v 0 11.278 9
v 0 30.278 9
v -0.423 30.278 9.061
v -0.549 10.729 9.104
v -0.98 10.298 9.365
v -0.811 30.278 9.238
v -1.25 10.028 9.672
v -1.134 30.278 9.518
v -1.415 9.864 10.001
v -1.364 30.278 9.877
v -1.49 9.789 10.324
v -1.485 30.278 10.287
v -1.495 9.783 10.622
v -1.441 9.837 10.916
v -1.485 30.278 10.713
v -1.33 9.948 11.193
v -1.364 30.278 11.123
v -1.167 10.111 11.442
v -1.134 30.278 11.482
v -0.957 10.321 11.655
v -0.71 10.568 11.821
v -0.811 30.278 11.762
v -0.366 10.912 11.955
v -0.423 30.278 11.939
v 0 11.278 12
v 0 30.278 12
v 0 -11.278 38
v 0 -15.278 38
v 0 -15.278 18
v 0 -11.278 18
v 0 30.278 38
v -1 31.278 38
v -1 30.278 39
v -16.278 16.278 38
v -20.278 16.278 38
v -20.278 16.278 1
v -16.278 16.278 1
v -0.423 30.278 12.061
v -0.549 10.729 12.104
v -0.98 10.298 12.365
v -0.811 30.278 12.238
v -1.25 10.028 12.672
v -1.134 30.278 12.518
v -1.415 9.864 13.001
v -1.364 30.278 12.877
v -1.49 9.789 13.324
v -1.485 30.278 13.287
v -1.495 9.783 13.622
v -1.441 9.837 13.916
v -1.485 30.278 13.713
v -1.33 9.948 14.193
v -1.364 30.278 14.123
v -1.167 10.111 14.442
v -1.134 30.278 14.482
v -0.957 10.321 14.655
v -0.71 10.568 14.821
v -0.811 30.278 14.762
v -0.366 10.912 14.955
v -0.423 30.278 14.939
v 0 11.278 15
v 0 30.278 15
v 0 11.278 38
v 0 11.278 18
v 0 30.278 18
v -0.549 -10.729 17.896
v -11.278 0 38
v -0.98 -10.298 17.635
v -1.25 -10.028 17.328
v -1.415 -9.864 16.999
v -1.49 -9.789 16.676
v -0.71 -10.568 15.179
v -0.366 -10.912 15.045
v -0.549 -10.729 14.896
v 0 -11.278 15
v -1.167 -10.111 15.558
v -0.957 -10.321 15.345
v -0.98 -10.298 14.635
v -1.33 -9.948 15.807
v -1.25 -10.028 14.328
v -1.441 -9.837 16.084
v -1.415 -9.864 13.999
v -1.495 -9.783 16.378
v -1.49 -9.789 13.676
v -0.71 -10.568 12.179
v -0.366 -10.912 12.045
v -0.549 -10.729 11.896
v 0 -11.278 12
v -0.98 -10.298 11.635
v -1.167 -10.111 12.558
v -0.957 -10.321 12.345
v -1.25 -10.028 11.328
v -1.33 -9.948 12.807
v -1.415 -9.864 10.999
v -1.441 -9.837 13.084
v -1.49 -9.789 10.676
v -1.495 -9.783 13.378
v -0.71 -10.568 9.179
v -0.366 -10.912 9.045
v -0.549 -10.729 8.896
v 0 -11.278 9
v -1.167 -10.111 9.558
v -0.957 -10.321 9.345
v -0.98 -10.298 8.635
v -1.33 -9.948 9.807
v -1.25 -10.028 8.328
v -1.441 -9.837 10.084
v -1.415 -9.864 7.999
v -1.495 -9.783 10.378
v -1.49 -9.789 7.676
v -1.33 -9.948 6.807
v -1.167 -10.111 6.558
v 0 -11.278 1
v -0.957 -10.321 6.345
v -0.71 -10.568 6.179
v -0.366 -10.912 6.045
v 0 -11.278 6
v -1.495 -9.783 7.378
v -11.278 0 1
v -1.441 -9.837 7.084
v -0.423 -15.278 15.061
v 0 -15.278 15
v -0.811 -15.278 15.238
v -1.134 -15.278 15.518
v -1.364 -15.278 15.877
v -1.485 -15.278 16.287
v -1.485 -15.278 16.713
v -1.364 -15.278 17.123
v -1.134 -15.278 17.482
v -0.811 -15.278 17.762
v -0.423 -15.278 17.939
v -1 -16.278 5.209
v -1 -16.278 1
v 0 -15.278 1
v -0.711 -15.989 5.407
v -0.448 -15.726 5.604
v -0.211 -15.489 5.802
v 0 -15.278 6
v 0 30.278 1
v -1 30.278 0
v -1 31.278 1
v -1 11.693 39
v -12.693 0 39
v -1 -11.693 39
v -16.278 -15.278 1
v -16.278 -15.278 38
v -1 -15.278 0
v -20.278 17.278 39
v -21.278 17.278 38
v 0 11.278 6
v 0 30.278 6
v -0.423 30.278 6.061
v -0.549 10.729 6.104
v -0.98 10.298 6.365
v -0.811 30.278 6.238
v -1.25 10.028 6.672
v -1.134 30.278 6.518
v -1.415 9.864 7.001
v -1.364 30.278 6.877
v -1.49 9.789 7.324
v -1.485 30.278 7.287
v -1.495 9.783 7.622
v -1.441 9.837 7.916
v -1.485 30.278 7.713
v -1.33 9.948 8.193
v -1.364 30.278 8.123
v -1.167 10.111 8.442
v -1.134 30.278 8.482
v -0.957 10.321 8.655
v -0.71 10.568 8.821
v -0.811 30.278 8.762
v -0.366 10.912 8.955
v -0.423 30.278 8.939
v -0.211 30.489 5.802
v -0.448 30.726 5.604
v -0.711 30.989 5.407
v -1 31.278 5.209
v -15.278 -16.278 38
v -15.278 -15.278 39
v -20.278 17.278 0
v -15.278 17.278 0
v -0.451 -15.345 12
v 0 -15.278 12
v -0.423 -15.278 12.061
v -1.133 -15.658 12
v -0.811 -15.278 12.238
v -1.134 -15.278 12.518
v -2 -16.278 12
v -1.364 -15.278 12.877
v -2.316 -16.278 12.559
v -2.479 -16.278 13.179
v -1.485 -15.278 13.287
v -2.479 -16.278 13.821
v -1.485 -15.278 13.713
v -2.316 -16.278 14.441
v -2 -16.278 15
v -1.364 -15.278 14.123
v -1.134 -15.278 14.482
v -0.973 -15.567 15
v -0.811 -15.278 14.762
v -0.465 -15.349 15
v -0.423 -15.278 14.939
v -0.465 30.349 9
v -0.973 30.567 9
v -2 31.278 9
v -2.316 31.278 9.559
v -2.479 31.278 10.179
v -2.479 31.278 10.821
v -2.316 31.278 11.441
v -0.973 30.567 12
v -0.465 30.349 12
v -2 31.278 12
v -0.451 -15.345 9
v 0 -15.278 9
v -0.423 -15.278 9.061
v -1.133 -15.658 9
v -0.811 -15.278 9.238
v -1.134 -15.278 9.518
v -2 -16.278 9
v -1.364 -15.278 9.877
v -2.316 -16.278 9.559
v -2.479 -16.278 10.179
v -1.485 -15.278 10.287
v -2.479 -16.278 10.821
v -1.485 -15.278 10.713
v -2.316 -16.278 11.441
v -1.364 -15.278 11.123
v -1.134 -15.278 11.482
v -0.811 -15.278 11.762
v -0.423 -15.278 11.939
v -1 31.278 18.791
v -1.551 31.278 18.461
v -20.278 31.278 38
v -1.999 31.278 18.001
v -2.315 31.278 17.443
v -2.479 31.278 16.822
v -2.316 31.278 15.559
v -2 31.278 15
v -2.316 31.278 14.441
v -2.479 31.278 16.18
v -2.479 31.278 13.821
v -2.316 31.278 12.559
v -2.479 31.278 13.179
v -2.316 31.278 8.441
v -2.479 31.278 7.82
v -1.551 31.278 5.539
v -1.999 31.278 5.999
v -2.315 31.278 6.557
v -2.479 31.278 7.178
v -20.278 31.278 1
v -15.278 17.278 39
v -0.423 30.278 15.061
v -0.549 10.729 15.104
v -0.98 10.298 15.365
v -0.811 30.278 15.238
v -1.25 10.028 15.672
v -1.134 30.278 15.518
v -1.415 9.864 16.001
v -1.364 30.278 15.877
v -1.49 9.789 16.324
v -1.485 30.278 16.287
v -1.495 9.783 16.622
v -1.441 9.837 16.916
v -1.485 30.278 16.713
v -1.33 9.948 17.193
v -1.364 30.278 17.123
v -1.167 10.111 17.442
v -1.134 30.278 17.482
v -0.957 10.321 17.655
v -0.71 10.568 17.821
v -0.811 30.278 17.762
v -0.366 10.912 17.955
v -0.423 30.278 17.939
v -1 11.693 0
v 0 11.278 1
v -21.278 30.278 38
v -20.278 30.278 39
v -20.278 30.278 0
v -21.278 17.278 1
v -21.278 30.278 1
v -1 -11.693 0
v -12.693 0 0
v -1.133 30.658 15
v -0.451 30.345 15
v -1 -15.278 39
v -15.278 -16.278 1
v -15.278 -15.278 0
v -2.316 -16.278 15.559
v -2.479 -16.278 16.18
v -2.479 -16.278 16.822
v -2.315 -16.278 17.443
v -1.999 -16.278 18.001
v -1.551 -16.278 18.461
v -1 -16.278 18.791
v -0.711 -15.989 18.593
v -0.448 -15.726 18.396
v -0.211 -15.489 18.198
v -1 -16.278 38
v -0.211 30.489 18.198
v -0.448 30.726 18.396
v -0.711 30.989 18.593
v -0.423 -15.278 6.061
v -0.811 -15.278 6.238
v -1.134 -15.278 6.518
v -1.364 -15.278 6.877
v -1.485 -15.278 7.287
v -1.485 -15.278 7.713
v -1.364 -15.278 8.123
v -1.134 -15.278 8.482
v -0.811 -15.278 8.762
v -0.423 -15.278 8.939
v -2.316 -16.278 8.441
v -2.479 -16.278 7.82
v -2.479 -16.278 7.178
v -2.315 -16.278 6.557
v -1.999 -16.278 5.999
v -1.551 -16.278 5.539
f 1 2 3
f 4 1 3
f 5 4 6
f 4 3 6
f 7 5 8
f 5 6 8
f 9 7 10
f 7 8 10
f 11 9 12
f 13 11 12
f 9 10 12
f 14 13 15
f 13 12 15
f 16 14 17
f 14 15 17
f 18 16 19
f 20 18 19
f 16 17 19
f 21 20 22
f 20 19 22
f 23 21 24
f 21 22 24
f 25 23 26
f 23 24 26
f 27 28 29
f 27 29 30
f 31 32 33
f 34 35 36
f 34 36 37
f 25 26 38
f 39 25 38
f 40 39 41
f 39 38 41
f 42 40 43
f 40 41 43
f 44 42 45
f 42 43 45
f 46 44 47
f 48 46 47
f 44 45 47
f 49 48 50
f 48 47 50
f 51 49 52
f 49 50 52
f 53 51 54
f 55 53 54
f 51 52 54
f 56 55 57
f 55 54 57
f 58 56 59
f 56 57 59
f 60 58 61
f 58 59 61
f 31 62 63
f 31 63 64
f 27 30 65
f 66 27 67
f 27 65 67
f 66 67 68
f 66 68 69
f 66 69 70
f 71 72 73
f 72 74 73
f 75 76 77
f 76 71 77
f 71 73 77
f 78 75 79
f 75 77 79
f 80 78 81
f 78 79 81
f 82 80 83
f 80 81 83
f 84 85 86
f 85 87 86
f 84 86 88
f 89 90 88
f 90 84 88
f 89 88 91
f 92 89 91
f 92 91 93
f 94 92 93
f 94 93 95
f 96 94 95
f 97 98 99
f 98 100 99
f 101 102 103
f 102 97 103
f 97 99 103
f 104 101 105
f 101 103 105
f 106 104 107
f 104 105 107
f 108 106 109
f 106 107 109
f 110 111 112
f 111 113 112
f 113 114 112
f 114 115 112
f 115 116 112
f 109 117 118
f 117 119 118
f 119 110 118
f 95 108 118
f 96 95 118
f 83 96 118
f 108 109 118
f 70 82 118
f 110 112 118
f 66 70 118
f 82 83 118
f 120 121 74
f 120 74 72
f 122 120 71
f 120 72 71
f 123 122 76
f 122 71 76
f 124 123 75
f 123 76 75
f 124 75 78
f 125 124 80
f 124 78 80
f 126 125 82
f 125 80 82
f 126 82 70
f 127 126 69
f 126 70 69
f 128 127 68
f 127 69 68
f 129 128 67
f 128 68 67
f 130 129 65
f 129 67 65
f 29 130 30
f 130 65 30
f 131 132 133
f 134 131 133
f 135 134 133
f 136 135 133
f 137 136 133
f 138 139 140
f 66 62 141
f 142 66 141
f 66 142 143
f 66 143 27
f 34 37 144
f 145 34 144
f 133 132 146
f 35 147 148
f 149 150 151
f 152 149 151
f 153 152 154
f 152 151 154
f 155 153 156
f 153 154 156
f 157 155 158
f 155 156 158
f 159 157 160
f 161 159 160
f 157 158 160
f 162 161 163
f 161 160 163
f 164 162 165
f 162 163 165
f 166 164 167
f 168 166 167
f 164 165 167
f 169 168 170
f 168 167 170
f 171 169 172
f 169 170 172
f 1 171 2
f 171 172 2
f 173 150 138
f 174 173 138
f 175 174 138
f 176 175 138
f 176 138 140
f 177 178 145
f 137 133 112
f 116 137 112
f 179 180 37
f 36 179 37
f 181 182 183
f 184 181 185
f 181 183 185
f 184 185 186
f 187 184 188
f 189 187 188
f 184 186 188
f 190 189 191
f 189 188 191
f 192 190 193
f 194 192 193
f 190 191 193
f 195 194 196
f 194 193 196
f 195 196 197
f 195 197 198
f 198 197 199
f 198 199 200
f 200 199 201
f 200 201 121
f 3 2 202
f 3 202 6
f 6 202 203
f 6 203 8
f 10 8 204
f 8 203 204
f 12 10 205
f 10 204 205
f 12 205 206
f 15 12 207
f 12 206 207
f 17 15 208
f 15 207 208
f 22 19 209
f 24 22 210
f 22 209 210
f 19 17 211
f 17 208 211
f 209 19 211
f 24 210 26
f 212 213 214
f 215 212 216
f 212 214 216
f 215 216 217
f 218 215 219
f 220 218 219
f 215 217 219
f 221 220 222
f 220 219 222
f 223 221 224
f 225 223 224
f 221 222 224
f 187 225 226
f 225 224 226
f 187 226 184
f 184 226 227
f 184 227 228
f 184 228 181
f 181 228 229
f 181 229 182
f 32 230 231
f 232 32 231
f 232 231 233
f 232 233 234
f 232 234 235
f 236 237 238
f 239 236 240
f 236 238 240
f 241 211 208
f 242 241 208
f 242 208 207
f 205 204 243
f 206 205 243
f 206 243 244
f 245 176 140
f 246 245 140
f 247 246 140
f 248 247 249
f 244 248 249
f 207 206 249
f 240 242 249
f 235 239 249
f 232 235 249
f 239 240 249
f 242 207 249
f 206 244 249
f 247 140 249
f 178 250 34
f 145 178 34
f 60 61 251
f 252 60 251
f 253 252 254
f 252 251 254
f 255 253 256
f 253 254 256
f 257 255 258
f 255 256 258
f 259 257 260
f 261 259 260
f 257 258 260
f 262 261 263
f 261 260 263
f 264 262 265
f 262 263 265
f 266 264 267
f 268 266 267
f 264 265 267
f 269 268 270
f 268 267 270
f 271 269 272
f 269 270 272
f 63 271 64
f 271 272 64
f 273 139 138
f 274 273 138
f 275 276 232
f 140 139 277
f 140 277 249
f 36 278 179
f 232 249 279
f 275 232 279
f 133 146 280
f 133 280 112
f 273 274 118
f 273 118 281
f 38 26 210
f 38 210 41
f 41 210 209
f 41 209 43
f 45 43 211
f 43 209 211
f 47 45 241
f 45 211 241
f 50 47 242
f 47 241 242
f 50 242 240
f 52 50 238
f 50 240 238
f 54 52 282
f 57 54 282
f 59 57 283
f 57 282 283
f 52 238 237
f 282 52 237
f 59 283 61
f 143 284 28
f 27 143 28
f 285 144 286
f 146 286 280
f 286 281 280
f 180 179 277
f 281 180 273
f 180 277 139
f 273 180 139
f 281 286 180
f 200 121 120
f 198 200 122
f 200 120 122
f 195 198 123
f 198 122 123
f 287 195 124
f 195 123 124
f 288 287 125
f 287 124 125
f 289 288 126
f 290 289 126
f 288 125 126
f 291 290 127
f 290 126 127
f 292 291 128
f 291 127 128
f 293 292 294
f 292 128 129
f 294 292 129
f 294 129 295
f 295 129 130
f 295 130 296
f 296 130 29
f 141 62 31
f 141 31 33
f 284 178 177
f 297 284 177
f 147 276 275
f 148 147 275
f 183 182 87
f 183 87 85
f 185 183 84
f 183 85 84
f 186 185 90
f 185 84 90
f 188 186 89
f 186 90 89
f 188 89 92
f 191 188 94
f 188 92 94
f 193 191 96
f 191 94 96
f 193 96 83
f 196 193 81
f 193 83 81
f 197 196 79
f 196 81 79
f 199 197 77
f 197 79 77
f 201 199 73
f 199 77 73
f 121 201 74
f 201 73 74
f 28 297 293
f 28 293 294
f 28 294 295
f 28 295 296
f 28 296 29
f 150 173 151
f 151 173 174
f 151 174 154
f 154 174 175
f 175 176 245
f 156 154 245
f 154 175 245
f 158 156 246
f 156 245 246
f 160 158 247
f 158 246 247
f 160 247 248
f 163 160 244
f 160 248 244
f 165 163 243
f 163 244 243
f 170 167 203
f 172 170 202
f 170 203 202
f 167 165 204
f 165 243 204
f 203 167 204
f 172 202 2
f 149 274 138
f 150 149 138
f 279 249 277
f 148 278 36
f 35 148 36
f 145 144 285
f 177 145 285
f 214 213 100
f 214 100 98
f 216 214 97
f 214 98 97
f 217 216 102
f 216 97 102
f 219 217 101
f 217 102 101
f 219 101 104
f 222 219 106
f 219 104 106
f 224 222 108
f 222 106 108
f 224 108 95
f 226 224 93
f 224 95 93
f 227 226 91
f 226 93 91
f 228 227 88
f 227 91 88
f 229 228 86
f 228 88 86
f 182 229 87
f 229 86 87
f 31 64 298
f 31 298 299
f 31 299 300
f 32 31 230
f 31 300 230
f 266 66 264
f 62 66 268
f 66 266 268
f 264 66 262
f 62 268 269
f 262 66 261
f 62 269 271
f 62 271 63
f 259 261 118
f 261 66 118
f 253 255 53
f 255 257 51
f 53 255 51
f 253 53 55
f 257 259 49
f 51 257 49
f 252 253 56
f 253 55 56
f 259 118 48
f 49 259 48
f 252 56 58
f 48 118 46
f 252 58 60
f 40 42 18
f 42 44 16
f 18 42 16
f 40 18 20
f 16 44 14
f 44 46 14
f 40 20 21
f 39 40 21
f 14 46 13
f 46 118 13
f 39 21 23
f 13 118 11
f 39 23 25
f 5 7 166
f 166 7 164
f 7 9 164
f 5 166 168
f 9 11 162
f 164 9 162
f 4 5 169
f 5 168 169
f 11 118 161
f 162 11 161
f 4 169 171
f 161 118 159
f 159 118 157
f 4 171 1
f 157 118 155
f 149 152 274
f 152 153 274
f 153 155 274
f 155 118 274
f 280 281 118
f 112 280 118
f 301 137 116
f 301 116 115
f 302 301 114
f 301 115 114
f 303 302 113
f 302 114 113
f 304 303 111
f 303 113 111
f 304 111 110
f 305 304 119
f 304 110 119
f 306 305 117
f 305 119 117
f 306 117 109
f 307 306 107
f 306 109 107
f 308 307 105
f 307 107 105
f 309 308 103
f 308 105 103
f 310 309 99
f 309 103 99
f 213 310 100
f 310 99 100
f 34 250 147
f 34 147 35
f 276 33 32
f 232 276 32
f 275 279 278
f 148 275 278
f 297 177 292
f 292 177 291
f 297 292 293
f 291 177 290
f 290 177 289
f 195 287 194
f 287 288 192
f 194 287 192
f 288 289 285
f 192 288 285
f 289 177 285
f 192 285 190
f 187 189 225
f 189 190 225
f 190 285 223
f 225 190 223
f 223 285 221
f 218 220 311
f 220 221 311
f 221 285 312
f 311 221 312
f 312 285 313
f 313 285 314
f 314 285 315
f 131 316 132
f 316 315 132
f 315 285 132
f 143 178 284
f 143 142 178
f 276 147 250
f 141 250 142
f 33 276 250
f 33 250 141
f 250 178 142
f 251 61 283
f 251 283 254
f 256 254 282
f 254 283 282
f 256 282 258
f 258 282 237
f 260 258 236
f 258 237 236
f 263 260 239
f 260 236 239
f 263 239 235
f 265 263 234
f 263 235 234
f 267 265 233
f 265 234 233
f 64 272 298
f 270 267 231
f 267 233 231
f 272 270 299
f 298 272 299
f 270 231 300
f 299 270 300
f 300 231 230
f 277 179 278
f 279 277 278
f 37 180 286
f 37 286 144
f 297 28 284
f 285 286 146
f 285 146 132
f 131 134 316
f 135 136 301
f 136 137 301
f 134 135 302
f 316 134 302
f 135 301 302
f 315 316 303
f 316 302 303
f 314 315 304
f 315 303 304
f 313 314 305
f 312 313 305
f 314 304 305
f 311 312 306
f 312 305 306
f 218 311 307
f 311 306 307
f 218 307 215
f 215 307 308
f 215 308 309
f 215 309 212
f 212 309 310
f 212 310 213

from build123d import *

# Parameters (mm, degrees)
BOSS_EXTRUDE1_DEPTH = 39
SKETCH2_R           = 1.5
CUT_EXTRUDE1_DEPTH  = 66.080017127
LPATTERN2_COUNT     = 10
LPATTERN2_PITCH     = 3
CHAMFER2_SIZE       = 1


with BuildPart() as part:
    # Sketch1 → Boss-Extrude1 (new body)
    with BuildSketch(Plane.XY):
        Polygon((-11.27835316, 0), (0, 11.27835316), (0, 31.27835316), (-21.27835316, 31.27835316), (-21.27835316, 16.27835316), (-16.27835316, 16.27835316), (-16.27835316, -16.27835316), (0, -16.27835316), (0, -11.27835316), align=None)
    extrude(amount=BOSS_EXTRUDE1_DEPTH)

    # Sketch2 → Cut-Extrude1 (cut, through all)
    with BuildSketch(Plane(origin=(0, 31.27835316, 0), x_dir=(1, 0, 0), z_dir=(0, 1, 0))):
        with Locations((0, -7.5)):
            Circle(SKETCH2_R)
    cut_extrude1 = extrude(amount=-CUT_EXTRUDE1_DEPTH, mode=Mode.SUBTRACT)

    # LPattern2: Cut-Extrude1 ×10, 6 skipped
    with Locations(*[(0, 0, i * LPATTERN2_PITCH) for i in range(1, LPATTERN2_COUNT) if i not in (4, 5, 6, 7, 8, 9)]):
        add(cut_extrude1, mode=Mode.SUBTRACT)

    # Chamfer2
    chamfer2_edges = [part.edges().sort_by_distance(p)[0] for p in [
        (-1.5, 31.27835316, 16.5),
        (-1.5, 31.27835316, 13.5),
        (-1.5, 31.27835316, 10.5),
        (-1.5, 31.27835316, 7.5),
        (0, 31.27835316, 3),
        (-1.5, -16.27835316, 16.5),
        (-1.5, -16.27835316, 13.5),
        (-1.5, -16.27835316, 10.5),
        (-1.5, -16.27835316, 7.5),
        (0, -16.27835316, 3),
        (0, -13.77835316, 39),
        (-8.13917658, -16.27835316, 39),
        (-18.77835316, 16.27835316, 39),
        (-5.63917658, -5.63917658, 39),
        (-5.63917658, 5.63917658, 39),
        (0, 21.27835316, 39),
        (-10.63917658, 31.27835316, 39),
        (-5.63917658, 5.63917658, 0),
        (0, 21.27835316, 0),
        (-10.63917658, 31.27835316, 0),
        (-21.27835316, 31.27835316, 19.5),
        (-21.27835316, 23.77835316, 39),
        (-21.27835316, 16.27835316, 19.5),
        (-21.27835316, 23.77835316, 0),
        (-18.77835316, 16.27835316, 0),
        (-5.63917658, -5.63917658, 0),
        (0, -13.77835316, 0),
        (-8.13917658, -16.27835316, 0),
        (-16.27835316, 0, 39),
        (-16.27835316, -16.27835316, 19.5),
        (-16.27835316, 0, 0),
        (0, 31.27835316, 28.5),
        (0, -16.27835316, 28.5),
    ]]
    chamfer(chamfer2_edges, length=CHAMFER2_SIZE)


solid = part.part
